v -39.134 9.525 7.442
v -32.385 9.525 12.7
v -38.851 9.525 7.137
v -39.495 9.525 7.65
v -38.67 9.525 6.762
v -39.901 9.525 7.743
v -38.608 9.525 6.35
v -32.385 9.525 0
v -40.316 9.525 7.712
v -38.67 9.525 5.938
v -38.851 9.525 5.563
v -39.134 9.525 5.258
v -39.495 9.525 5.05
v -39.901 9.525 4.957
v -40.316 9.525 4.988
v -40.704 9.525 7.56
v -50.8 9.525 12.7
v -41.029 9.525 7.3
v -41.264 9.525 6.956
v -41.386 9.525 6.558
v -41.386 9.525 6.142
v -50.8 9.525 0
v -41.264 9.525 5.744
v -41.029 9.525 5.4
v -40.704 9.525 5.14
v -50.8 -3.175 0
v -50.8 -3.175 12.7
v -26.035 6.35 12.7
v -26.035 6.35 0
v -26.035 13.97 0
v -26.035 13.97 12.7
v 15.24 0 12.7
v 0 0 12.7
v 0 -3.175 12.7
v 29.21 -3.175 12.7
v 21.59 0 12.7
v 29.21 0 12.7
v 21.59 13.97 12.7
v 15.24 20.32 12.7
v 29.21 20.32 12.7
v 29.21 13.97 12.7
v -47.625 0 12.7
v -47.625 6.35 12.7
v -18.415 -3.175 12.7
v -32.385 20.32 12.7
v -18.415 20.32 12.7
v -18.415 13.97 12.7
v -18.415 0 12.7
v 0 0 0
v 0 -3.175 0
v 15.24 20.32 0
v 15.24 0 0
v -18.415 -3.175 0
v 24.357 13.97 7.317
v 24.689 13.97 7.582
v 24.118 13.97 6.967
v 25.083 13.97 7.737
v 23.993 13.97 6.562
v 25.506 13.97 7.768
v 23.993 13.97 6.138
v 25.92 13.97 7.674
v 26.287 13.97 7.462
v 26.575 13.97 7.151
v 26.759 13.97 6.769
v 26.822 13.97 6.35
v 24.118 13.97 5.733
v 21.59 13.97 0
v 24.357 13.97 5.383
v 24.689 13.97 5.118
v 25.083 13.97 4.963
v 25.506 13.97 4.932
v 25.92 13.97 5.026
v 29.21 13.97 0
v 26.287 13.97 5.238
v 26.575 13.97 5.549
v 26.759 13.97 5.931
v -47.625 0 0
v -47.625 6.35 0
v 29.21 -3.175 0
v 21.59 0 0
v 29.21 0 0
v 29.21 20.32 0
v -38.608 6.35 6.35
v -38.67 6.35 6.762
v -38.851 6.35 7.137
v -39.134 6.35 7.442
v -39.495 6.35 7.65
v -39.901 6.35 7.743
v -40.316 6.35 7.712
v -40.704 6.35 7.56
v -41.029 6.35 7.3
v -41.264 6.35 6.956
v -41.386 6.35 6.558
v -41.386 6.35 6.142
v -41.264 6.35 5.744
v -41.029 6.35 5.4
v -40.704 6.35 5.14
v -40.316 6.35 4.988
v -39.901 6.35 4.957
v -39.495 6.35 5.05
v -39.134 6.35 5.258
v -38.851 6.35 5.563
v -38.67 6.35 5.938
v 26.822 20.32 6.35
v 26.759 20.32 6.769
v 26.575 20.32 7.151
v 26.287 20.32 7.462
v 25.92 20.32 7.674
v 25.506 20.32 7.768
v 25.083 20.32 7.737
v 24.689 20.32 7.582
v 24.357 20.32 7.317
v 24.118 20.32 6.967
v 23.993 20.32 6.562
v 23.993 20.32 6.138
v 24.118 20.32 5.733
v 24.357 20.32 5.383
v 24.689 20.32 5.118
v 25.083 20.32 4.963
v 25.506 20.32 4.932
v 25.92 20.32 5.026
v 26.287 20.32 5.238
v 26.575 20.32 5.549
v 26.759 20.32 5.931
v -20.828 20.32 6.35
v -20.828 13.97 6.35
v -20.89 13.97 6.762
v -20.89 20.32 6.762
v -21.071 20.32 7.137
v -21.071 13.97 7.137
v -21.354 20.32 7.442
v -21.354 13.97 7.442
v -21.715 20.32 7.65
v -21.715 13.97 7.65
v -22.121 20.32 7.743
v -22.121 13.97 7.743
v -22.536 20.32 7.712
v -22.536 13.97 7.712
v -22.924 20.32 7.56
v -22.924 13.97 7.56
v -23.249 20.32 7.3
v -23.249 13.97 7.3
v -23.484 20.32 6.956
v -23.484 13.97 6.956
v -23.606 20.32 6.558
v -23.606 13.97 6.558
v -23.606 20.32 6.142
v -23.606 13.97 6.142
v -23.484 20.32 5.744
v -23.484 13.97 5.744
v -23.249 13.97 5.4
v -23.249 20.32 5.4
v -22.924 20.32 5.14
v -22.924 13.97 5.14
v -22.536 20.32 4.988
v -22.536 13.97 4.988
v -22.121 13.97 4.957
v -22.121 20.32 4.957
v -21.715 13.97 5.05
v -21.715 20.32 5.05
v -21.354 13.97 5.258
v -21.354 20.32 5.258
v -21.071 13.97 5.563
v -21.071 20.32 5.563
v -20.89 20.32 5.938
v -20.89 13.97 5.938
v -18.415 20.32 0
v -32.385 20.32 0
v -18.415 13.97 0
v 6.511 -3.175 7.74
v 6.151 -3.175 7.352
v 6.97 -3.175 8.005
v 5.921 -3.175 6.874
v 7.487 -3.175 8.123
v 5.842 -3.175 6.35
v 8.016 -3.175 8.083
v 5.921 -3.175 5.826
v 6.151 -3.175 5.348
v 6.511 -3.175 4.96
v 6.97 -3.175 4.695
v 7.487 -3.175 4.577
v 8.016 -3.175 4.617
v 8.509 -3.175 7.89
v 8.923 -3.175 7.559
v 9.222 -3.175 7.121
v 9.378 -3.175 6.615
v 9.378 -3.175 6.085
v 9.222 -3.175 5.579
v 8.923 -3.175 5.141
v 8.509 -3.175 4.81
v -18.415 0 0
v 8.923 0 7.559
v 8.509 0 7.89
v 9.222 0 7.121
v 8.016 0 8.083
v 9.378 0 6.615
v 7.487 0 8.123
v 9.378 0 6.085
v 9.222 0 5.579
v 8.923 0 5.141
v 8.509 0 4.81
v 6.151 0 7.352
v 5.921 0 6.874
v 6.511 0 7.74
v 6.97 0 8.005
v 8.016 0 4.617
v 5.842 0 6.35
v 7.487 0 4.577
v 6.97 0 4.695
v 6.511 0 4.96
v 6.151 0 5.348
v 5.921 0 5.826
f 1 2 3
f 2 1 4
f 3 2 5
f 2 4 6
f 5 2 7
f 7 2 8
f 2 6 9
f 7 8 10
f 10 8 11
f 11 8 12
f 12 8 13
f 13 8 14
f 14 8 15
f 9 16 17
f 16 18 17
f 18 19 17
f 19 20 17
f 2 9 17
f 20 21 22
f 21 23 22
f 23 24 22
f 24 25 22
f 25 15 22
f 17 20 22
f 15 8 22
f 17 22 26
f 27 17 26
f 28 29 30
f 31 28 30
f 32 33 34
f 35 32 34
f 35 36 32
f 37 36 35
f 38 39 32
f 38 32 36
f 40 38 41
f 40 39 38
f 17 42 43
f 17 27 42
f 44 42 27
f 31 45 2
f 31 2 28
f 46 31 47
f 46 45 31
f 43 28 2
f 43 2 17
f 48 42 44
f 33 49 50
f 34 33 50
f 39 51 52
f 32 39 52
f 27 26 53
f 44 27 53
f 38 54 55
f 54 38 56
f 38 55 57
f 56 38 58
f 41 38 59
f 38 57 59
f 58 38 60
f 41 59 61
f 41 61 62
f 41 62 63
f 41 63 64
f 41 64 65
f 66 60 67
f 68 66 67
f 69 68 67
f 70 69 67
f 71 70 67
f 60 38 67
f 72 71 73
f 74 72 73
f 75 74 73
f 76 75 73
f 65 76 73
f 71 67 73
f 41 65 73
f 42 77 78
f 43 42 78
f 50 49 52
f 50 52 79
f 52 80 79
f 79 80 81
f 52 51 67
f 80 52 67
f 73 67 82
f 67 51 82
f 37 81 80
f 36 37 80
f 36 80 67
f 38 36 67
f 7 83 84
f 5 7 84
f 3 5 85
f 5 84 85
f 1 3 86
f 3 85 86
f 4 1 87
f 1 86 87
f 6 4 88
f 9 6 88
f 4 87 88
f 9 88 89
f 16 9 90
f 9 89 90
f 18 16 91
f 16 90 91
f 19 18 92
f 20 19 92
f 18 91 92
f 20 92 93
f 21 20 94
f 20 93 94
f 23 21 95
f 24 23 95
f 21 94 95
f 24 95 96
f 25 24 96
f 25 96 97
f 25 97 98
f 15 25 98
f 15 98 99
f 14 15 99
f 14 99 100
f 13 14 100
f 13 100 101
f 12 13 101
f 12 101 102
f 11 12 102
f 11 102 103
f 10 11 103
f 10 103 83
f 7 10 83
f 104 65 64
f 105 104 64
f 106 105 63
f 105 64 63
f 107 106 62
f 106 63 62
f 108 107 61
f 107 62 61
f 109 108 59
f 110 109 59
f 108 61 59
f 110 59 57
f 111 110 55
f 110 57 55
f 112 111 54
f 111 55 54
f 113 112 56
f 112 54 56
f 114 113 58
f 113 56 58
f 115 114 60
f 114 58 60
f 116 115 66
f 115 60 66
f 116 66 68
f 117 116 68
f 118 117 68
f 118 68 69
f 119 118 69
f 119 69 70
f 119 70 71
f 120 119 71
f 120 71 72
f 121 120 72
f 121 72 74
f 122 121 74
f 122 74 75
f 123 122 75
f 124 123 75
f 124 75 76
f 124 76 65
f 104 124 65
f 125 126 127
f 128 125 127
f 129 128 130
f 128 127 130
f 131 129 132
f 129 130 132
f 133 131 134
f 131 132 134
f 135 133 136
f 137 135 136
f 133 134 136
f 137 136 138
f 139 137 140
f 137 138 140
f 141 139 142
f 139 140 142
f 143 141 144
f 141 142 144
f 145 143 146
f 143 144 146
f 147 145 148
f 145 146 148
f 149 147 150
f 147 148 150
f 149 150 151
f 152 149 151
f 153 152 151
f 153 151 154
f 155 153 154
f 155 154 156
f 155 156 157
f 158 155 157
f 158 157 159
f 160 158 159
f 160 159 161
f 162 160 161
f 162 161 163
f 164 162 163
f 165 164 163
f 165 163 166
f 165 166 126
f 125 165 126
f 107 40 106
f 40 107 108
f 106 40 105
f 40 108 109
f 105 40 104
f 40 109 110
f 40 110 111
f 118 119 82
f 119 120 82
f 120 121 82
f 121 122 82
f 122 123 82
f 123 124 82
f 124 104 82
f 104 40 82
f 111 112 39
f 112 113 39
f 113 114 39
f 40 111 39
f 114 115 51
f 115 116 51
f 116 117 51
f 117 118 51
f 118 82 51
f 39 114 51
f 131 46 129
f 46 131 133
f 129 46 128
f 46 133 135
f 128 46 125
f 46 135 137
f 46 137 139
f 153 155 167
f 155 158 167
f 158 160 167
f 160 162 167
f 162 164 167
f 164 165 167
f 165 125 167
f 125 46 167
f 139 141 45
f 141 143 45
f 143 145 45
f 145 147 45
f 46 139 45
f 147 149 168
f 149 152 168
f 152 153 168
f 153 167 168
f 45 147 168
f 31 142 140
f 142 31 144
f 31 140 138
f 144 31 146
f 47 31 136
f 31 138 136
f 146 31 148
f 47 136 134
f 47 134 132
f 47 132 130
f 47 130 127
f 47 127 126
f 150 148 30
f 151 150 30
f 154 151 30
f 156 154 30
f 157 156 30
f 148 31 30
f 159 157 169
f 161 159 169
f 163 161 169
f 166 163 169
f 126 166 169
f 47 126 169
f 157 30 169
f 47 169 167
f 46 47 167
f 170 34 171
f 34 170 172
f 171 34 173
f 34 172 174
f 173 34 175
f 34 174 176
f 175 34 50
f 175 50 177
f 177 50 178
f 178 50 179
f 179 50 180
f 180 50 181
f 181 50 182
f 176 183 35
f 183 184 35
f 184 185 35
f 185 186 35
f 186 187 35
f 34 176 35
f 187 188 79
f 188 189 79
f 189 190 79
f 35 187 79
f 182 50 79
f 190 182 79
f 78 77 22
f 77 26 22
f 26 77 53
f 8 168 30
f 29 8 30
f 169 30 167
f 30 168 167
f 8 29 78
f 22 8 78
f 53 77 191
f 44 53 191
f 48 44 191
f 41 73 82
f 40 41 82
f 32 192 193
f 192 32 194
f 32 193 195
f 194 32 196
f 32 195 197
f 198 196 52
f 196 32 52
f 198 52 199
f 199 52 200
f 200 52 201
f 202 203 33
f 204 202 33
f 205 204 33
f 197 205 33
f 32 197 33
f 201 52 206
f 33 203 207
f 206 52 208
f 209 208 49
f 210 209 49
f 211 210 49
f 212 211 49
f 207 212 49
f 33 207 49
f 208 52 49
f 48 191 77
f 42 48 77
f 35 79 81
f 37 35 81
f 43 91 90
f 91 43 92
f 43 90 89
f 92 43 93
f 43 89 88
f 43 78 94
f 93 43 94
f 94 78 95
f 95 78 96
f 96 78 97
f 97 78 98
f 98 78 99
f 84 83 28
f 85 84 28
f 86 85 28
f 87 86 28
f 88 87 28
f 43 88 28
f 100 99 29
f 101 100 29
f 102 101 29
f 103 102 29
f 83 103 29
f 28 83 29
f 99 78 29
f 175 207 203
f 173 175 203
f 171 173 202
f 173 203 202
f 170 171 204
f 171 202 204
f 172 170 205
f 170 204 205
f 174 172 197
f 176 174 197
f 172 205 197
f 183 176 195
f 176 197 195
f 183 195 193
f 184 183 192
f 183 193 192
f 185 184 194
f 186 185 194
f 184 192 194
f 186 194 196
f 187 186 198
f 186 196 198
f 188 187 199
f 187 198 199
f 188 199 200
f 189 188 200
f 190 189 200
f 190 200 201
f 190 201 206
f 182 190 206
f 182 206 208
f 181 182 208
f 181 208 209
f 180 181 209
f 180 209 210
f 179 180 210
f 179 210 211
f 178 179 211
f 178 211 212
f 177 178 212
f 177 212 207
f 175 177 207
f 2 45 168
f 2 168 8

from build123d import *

# Parameters (mm, degrees)
F1_DEPTH  = 12.7
F2_R      = 1.4224
F3_DEPTH  = 25.4
F4_R      = 1.778
F5_DEPTH  = 25.4
F7_DEPTH  = 12.7
F8_R      = 1.397
F9_DEPTH  = 25.4
F10_R     = 1.397
F11_DEPTH = 25.4


with BuildPart() as f1:
    # F0 (on Top) → F1 (new body)
    with BuildSketch(Plane.XY):
        Polygon((15.24, 0), (0, 0), (0, -3.175), (21.59, -3.175), (29.21, -3.175), (29.21, 0), (21.59, 0), (21.59, 13.97), (29.21, 13.97), (29.21, 20.32), (15.24, 20.32), align=None)
    extrude(amount=F1_DEPTH)

    # F2 (on face) → F3 (cut)
    with BuildSketch(Plane.XZ.offset(-13.97)):
        with Locations((25.4, 6.35)):
            Circle(F2_R)
    extrude(amount=-F3_DEPTH, mode=Mode.SUBTRACT)

    # F4 (on face) → F5 (cut)
    with BuildSketch(Plane(origin=(0, 0, 0), x_dir=(-1, 0, 0), z_dir=(0, 1, 0))):
        with Locations((-7.62, 6.35)):
            Circle(F4_R)
    extrude(amount=-F5_DEPTH, mode=Mode.SUBTRACT)


with BuildPart() as f7:
    # F6 (on Top) → F7 (new body)
    with BuildSketch(Plane.XY):
        Polygon((-32.385, 0), (-47.625, 0), (-47.625, 6.35), (-32.385, 6.35), (-26.035, 6.35), (-26.035, 13.97), (-18.415, 13.97), (-18.415, 20.32), (-32.385, 20.32), (-32.385, 9.525), (-47.625, 9.525), (-50.8, 9.525), (-50.8, -3.175), (-47.625, -3.175), (-32.385, -3.175), (-18.415, -3.175), (-18.415, 0), align=None)
    extrude(amount=F7_DEPTH)

    # F8 (on face) → F9 (cut)
    with BuildSketch(Plane.XZ.offset(-13.97)):
        with Locations((-22.225, 6.35)):
            Circle(F8_R)
    extrude(amount=-F9_DEPTH, mode=Mode.SUBTRACT)

    # F10 (on face) → F11 (cut)
    with BuildSketch(Plane.XZ.offset(-6.35)):
        with Locations((-40.005, 6.35)):
            Circle(F10_R)
    extrude(amount=-F11_DEPTH, mode=Mode.SUBTRACT)


solid = Compound([f1.part, f7.part])
